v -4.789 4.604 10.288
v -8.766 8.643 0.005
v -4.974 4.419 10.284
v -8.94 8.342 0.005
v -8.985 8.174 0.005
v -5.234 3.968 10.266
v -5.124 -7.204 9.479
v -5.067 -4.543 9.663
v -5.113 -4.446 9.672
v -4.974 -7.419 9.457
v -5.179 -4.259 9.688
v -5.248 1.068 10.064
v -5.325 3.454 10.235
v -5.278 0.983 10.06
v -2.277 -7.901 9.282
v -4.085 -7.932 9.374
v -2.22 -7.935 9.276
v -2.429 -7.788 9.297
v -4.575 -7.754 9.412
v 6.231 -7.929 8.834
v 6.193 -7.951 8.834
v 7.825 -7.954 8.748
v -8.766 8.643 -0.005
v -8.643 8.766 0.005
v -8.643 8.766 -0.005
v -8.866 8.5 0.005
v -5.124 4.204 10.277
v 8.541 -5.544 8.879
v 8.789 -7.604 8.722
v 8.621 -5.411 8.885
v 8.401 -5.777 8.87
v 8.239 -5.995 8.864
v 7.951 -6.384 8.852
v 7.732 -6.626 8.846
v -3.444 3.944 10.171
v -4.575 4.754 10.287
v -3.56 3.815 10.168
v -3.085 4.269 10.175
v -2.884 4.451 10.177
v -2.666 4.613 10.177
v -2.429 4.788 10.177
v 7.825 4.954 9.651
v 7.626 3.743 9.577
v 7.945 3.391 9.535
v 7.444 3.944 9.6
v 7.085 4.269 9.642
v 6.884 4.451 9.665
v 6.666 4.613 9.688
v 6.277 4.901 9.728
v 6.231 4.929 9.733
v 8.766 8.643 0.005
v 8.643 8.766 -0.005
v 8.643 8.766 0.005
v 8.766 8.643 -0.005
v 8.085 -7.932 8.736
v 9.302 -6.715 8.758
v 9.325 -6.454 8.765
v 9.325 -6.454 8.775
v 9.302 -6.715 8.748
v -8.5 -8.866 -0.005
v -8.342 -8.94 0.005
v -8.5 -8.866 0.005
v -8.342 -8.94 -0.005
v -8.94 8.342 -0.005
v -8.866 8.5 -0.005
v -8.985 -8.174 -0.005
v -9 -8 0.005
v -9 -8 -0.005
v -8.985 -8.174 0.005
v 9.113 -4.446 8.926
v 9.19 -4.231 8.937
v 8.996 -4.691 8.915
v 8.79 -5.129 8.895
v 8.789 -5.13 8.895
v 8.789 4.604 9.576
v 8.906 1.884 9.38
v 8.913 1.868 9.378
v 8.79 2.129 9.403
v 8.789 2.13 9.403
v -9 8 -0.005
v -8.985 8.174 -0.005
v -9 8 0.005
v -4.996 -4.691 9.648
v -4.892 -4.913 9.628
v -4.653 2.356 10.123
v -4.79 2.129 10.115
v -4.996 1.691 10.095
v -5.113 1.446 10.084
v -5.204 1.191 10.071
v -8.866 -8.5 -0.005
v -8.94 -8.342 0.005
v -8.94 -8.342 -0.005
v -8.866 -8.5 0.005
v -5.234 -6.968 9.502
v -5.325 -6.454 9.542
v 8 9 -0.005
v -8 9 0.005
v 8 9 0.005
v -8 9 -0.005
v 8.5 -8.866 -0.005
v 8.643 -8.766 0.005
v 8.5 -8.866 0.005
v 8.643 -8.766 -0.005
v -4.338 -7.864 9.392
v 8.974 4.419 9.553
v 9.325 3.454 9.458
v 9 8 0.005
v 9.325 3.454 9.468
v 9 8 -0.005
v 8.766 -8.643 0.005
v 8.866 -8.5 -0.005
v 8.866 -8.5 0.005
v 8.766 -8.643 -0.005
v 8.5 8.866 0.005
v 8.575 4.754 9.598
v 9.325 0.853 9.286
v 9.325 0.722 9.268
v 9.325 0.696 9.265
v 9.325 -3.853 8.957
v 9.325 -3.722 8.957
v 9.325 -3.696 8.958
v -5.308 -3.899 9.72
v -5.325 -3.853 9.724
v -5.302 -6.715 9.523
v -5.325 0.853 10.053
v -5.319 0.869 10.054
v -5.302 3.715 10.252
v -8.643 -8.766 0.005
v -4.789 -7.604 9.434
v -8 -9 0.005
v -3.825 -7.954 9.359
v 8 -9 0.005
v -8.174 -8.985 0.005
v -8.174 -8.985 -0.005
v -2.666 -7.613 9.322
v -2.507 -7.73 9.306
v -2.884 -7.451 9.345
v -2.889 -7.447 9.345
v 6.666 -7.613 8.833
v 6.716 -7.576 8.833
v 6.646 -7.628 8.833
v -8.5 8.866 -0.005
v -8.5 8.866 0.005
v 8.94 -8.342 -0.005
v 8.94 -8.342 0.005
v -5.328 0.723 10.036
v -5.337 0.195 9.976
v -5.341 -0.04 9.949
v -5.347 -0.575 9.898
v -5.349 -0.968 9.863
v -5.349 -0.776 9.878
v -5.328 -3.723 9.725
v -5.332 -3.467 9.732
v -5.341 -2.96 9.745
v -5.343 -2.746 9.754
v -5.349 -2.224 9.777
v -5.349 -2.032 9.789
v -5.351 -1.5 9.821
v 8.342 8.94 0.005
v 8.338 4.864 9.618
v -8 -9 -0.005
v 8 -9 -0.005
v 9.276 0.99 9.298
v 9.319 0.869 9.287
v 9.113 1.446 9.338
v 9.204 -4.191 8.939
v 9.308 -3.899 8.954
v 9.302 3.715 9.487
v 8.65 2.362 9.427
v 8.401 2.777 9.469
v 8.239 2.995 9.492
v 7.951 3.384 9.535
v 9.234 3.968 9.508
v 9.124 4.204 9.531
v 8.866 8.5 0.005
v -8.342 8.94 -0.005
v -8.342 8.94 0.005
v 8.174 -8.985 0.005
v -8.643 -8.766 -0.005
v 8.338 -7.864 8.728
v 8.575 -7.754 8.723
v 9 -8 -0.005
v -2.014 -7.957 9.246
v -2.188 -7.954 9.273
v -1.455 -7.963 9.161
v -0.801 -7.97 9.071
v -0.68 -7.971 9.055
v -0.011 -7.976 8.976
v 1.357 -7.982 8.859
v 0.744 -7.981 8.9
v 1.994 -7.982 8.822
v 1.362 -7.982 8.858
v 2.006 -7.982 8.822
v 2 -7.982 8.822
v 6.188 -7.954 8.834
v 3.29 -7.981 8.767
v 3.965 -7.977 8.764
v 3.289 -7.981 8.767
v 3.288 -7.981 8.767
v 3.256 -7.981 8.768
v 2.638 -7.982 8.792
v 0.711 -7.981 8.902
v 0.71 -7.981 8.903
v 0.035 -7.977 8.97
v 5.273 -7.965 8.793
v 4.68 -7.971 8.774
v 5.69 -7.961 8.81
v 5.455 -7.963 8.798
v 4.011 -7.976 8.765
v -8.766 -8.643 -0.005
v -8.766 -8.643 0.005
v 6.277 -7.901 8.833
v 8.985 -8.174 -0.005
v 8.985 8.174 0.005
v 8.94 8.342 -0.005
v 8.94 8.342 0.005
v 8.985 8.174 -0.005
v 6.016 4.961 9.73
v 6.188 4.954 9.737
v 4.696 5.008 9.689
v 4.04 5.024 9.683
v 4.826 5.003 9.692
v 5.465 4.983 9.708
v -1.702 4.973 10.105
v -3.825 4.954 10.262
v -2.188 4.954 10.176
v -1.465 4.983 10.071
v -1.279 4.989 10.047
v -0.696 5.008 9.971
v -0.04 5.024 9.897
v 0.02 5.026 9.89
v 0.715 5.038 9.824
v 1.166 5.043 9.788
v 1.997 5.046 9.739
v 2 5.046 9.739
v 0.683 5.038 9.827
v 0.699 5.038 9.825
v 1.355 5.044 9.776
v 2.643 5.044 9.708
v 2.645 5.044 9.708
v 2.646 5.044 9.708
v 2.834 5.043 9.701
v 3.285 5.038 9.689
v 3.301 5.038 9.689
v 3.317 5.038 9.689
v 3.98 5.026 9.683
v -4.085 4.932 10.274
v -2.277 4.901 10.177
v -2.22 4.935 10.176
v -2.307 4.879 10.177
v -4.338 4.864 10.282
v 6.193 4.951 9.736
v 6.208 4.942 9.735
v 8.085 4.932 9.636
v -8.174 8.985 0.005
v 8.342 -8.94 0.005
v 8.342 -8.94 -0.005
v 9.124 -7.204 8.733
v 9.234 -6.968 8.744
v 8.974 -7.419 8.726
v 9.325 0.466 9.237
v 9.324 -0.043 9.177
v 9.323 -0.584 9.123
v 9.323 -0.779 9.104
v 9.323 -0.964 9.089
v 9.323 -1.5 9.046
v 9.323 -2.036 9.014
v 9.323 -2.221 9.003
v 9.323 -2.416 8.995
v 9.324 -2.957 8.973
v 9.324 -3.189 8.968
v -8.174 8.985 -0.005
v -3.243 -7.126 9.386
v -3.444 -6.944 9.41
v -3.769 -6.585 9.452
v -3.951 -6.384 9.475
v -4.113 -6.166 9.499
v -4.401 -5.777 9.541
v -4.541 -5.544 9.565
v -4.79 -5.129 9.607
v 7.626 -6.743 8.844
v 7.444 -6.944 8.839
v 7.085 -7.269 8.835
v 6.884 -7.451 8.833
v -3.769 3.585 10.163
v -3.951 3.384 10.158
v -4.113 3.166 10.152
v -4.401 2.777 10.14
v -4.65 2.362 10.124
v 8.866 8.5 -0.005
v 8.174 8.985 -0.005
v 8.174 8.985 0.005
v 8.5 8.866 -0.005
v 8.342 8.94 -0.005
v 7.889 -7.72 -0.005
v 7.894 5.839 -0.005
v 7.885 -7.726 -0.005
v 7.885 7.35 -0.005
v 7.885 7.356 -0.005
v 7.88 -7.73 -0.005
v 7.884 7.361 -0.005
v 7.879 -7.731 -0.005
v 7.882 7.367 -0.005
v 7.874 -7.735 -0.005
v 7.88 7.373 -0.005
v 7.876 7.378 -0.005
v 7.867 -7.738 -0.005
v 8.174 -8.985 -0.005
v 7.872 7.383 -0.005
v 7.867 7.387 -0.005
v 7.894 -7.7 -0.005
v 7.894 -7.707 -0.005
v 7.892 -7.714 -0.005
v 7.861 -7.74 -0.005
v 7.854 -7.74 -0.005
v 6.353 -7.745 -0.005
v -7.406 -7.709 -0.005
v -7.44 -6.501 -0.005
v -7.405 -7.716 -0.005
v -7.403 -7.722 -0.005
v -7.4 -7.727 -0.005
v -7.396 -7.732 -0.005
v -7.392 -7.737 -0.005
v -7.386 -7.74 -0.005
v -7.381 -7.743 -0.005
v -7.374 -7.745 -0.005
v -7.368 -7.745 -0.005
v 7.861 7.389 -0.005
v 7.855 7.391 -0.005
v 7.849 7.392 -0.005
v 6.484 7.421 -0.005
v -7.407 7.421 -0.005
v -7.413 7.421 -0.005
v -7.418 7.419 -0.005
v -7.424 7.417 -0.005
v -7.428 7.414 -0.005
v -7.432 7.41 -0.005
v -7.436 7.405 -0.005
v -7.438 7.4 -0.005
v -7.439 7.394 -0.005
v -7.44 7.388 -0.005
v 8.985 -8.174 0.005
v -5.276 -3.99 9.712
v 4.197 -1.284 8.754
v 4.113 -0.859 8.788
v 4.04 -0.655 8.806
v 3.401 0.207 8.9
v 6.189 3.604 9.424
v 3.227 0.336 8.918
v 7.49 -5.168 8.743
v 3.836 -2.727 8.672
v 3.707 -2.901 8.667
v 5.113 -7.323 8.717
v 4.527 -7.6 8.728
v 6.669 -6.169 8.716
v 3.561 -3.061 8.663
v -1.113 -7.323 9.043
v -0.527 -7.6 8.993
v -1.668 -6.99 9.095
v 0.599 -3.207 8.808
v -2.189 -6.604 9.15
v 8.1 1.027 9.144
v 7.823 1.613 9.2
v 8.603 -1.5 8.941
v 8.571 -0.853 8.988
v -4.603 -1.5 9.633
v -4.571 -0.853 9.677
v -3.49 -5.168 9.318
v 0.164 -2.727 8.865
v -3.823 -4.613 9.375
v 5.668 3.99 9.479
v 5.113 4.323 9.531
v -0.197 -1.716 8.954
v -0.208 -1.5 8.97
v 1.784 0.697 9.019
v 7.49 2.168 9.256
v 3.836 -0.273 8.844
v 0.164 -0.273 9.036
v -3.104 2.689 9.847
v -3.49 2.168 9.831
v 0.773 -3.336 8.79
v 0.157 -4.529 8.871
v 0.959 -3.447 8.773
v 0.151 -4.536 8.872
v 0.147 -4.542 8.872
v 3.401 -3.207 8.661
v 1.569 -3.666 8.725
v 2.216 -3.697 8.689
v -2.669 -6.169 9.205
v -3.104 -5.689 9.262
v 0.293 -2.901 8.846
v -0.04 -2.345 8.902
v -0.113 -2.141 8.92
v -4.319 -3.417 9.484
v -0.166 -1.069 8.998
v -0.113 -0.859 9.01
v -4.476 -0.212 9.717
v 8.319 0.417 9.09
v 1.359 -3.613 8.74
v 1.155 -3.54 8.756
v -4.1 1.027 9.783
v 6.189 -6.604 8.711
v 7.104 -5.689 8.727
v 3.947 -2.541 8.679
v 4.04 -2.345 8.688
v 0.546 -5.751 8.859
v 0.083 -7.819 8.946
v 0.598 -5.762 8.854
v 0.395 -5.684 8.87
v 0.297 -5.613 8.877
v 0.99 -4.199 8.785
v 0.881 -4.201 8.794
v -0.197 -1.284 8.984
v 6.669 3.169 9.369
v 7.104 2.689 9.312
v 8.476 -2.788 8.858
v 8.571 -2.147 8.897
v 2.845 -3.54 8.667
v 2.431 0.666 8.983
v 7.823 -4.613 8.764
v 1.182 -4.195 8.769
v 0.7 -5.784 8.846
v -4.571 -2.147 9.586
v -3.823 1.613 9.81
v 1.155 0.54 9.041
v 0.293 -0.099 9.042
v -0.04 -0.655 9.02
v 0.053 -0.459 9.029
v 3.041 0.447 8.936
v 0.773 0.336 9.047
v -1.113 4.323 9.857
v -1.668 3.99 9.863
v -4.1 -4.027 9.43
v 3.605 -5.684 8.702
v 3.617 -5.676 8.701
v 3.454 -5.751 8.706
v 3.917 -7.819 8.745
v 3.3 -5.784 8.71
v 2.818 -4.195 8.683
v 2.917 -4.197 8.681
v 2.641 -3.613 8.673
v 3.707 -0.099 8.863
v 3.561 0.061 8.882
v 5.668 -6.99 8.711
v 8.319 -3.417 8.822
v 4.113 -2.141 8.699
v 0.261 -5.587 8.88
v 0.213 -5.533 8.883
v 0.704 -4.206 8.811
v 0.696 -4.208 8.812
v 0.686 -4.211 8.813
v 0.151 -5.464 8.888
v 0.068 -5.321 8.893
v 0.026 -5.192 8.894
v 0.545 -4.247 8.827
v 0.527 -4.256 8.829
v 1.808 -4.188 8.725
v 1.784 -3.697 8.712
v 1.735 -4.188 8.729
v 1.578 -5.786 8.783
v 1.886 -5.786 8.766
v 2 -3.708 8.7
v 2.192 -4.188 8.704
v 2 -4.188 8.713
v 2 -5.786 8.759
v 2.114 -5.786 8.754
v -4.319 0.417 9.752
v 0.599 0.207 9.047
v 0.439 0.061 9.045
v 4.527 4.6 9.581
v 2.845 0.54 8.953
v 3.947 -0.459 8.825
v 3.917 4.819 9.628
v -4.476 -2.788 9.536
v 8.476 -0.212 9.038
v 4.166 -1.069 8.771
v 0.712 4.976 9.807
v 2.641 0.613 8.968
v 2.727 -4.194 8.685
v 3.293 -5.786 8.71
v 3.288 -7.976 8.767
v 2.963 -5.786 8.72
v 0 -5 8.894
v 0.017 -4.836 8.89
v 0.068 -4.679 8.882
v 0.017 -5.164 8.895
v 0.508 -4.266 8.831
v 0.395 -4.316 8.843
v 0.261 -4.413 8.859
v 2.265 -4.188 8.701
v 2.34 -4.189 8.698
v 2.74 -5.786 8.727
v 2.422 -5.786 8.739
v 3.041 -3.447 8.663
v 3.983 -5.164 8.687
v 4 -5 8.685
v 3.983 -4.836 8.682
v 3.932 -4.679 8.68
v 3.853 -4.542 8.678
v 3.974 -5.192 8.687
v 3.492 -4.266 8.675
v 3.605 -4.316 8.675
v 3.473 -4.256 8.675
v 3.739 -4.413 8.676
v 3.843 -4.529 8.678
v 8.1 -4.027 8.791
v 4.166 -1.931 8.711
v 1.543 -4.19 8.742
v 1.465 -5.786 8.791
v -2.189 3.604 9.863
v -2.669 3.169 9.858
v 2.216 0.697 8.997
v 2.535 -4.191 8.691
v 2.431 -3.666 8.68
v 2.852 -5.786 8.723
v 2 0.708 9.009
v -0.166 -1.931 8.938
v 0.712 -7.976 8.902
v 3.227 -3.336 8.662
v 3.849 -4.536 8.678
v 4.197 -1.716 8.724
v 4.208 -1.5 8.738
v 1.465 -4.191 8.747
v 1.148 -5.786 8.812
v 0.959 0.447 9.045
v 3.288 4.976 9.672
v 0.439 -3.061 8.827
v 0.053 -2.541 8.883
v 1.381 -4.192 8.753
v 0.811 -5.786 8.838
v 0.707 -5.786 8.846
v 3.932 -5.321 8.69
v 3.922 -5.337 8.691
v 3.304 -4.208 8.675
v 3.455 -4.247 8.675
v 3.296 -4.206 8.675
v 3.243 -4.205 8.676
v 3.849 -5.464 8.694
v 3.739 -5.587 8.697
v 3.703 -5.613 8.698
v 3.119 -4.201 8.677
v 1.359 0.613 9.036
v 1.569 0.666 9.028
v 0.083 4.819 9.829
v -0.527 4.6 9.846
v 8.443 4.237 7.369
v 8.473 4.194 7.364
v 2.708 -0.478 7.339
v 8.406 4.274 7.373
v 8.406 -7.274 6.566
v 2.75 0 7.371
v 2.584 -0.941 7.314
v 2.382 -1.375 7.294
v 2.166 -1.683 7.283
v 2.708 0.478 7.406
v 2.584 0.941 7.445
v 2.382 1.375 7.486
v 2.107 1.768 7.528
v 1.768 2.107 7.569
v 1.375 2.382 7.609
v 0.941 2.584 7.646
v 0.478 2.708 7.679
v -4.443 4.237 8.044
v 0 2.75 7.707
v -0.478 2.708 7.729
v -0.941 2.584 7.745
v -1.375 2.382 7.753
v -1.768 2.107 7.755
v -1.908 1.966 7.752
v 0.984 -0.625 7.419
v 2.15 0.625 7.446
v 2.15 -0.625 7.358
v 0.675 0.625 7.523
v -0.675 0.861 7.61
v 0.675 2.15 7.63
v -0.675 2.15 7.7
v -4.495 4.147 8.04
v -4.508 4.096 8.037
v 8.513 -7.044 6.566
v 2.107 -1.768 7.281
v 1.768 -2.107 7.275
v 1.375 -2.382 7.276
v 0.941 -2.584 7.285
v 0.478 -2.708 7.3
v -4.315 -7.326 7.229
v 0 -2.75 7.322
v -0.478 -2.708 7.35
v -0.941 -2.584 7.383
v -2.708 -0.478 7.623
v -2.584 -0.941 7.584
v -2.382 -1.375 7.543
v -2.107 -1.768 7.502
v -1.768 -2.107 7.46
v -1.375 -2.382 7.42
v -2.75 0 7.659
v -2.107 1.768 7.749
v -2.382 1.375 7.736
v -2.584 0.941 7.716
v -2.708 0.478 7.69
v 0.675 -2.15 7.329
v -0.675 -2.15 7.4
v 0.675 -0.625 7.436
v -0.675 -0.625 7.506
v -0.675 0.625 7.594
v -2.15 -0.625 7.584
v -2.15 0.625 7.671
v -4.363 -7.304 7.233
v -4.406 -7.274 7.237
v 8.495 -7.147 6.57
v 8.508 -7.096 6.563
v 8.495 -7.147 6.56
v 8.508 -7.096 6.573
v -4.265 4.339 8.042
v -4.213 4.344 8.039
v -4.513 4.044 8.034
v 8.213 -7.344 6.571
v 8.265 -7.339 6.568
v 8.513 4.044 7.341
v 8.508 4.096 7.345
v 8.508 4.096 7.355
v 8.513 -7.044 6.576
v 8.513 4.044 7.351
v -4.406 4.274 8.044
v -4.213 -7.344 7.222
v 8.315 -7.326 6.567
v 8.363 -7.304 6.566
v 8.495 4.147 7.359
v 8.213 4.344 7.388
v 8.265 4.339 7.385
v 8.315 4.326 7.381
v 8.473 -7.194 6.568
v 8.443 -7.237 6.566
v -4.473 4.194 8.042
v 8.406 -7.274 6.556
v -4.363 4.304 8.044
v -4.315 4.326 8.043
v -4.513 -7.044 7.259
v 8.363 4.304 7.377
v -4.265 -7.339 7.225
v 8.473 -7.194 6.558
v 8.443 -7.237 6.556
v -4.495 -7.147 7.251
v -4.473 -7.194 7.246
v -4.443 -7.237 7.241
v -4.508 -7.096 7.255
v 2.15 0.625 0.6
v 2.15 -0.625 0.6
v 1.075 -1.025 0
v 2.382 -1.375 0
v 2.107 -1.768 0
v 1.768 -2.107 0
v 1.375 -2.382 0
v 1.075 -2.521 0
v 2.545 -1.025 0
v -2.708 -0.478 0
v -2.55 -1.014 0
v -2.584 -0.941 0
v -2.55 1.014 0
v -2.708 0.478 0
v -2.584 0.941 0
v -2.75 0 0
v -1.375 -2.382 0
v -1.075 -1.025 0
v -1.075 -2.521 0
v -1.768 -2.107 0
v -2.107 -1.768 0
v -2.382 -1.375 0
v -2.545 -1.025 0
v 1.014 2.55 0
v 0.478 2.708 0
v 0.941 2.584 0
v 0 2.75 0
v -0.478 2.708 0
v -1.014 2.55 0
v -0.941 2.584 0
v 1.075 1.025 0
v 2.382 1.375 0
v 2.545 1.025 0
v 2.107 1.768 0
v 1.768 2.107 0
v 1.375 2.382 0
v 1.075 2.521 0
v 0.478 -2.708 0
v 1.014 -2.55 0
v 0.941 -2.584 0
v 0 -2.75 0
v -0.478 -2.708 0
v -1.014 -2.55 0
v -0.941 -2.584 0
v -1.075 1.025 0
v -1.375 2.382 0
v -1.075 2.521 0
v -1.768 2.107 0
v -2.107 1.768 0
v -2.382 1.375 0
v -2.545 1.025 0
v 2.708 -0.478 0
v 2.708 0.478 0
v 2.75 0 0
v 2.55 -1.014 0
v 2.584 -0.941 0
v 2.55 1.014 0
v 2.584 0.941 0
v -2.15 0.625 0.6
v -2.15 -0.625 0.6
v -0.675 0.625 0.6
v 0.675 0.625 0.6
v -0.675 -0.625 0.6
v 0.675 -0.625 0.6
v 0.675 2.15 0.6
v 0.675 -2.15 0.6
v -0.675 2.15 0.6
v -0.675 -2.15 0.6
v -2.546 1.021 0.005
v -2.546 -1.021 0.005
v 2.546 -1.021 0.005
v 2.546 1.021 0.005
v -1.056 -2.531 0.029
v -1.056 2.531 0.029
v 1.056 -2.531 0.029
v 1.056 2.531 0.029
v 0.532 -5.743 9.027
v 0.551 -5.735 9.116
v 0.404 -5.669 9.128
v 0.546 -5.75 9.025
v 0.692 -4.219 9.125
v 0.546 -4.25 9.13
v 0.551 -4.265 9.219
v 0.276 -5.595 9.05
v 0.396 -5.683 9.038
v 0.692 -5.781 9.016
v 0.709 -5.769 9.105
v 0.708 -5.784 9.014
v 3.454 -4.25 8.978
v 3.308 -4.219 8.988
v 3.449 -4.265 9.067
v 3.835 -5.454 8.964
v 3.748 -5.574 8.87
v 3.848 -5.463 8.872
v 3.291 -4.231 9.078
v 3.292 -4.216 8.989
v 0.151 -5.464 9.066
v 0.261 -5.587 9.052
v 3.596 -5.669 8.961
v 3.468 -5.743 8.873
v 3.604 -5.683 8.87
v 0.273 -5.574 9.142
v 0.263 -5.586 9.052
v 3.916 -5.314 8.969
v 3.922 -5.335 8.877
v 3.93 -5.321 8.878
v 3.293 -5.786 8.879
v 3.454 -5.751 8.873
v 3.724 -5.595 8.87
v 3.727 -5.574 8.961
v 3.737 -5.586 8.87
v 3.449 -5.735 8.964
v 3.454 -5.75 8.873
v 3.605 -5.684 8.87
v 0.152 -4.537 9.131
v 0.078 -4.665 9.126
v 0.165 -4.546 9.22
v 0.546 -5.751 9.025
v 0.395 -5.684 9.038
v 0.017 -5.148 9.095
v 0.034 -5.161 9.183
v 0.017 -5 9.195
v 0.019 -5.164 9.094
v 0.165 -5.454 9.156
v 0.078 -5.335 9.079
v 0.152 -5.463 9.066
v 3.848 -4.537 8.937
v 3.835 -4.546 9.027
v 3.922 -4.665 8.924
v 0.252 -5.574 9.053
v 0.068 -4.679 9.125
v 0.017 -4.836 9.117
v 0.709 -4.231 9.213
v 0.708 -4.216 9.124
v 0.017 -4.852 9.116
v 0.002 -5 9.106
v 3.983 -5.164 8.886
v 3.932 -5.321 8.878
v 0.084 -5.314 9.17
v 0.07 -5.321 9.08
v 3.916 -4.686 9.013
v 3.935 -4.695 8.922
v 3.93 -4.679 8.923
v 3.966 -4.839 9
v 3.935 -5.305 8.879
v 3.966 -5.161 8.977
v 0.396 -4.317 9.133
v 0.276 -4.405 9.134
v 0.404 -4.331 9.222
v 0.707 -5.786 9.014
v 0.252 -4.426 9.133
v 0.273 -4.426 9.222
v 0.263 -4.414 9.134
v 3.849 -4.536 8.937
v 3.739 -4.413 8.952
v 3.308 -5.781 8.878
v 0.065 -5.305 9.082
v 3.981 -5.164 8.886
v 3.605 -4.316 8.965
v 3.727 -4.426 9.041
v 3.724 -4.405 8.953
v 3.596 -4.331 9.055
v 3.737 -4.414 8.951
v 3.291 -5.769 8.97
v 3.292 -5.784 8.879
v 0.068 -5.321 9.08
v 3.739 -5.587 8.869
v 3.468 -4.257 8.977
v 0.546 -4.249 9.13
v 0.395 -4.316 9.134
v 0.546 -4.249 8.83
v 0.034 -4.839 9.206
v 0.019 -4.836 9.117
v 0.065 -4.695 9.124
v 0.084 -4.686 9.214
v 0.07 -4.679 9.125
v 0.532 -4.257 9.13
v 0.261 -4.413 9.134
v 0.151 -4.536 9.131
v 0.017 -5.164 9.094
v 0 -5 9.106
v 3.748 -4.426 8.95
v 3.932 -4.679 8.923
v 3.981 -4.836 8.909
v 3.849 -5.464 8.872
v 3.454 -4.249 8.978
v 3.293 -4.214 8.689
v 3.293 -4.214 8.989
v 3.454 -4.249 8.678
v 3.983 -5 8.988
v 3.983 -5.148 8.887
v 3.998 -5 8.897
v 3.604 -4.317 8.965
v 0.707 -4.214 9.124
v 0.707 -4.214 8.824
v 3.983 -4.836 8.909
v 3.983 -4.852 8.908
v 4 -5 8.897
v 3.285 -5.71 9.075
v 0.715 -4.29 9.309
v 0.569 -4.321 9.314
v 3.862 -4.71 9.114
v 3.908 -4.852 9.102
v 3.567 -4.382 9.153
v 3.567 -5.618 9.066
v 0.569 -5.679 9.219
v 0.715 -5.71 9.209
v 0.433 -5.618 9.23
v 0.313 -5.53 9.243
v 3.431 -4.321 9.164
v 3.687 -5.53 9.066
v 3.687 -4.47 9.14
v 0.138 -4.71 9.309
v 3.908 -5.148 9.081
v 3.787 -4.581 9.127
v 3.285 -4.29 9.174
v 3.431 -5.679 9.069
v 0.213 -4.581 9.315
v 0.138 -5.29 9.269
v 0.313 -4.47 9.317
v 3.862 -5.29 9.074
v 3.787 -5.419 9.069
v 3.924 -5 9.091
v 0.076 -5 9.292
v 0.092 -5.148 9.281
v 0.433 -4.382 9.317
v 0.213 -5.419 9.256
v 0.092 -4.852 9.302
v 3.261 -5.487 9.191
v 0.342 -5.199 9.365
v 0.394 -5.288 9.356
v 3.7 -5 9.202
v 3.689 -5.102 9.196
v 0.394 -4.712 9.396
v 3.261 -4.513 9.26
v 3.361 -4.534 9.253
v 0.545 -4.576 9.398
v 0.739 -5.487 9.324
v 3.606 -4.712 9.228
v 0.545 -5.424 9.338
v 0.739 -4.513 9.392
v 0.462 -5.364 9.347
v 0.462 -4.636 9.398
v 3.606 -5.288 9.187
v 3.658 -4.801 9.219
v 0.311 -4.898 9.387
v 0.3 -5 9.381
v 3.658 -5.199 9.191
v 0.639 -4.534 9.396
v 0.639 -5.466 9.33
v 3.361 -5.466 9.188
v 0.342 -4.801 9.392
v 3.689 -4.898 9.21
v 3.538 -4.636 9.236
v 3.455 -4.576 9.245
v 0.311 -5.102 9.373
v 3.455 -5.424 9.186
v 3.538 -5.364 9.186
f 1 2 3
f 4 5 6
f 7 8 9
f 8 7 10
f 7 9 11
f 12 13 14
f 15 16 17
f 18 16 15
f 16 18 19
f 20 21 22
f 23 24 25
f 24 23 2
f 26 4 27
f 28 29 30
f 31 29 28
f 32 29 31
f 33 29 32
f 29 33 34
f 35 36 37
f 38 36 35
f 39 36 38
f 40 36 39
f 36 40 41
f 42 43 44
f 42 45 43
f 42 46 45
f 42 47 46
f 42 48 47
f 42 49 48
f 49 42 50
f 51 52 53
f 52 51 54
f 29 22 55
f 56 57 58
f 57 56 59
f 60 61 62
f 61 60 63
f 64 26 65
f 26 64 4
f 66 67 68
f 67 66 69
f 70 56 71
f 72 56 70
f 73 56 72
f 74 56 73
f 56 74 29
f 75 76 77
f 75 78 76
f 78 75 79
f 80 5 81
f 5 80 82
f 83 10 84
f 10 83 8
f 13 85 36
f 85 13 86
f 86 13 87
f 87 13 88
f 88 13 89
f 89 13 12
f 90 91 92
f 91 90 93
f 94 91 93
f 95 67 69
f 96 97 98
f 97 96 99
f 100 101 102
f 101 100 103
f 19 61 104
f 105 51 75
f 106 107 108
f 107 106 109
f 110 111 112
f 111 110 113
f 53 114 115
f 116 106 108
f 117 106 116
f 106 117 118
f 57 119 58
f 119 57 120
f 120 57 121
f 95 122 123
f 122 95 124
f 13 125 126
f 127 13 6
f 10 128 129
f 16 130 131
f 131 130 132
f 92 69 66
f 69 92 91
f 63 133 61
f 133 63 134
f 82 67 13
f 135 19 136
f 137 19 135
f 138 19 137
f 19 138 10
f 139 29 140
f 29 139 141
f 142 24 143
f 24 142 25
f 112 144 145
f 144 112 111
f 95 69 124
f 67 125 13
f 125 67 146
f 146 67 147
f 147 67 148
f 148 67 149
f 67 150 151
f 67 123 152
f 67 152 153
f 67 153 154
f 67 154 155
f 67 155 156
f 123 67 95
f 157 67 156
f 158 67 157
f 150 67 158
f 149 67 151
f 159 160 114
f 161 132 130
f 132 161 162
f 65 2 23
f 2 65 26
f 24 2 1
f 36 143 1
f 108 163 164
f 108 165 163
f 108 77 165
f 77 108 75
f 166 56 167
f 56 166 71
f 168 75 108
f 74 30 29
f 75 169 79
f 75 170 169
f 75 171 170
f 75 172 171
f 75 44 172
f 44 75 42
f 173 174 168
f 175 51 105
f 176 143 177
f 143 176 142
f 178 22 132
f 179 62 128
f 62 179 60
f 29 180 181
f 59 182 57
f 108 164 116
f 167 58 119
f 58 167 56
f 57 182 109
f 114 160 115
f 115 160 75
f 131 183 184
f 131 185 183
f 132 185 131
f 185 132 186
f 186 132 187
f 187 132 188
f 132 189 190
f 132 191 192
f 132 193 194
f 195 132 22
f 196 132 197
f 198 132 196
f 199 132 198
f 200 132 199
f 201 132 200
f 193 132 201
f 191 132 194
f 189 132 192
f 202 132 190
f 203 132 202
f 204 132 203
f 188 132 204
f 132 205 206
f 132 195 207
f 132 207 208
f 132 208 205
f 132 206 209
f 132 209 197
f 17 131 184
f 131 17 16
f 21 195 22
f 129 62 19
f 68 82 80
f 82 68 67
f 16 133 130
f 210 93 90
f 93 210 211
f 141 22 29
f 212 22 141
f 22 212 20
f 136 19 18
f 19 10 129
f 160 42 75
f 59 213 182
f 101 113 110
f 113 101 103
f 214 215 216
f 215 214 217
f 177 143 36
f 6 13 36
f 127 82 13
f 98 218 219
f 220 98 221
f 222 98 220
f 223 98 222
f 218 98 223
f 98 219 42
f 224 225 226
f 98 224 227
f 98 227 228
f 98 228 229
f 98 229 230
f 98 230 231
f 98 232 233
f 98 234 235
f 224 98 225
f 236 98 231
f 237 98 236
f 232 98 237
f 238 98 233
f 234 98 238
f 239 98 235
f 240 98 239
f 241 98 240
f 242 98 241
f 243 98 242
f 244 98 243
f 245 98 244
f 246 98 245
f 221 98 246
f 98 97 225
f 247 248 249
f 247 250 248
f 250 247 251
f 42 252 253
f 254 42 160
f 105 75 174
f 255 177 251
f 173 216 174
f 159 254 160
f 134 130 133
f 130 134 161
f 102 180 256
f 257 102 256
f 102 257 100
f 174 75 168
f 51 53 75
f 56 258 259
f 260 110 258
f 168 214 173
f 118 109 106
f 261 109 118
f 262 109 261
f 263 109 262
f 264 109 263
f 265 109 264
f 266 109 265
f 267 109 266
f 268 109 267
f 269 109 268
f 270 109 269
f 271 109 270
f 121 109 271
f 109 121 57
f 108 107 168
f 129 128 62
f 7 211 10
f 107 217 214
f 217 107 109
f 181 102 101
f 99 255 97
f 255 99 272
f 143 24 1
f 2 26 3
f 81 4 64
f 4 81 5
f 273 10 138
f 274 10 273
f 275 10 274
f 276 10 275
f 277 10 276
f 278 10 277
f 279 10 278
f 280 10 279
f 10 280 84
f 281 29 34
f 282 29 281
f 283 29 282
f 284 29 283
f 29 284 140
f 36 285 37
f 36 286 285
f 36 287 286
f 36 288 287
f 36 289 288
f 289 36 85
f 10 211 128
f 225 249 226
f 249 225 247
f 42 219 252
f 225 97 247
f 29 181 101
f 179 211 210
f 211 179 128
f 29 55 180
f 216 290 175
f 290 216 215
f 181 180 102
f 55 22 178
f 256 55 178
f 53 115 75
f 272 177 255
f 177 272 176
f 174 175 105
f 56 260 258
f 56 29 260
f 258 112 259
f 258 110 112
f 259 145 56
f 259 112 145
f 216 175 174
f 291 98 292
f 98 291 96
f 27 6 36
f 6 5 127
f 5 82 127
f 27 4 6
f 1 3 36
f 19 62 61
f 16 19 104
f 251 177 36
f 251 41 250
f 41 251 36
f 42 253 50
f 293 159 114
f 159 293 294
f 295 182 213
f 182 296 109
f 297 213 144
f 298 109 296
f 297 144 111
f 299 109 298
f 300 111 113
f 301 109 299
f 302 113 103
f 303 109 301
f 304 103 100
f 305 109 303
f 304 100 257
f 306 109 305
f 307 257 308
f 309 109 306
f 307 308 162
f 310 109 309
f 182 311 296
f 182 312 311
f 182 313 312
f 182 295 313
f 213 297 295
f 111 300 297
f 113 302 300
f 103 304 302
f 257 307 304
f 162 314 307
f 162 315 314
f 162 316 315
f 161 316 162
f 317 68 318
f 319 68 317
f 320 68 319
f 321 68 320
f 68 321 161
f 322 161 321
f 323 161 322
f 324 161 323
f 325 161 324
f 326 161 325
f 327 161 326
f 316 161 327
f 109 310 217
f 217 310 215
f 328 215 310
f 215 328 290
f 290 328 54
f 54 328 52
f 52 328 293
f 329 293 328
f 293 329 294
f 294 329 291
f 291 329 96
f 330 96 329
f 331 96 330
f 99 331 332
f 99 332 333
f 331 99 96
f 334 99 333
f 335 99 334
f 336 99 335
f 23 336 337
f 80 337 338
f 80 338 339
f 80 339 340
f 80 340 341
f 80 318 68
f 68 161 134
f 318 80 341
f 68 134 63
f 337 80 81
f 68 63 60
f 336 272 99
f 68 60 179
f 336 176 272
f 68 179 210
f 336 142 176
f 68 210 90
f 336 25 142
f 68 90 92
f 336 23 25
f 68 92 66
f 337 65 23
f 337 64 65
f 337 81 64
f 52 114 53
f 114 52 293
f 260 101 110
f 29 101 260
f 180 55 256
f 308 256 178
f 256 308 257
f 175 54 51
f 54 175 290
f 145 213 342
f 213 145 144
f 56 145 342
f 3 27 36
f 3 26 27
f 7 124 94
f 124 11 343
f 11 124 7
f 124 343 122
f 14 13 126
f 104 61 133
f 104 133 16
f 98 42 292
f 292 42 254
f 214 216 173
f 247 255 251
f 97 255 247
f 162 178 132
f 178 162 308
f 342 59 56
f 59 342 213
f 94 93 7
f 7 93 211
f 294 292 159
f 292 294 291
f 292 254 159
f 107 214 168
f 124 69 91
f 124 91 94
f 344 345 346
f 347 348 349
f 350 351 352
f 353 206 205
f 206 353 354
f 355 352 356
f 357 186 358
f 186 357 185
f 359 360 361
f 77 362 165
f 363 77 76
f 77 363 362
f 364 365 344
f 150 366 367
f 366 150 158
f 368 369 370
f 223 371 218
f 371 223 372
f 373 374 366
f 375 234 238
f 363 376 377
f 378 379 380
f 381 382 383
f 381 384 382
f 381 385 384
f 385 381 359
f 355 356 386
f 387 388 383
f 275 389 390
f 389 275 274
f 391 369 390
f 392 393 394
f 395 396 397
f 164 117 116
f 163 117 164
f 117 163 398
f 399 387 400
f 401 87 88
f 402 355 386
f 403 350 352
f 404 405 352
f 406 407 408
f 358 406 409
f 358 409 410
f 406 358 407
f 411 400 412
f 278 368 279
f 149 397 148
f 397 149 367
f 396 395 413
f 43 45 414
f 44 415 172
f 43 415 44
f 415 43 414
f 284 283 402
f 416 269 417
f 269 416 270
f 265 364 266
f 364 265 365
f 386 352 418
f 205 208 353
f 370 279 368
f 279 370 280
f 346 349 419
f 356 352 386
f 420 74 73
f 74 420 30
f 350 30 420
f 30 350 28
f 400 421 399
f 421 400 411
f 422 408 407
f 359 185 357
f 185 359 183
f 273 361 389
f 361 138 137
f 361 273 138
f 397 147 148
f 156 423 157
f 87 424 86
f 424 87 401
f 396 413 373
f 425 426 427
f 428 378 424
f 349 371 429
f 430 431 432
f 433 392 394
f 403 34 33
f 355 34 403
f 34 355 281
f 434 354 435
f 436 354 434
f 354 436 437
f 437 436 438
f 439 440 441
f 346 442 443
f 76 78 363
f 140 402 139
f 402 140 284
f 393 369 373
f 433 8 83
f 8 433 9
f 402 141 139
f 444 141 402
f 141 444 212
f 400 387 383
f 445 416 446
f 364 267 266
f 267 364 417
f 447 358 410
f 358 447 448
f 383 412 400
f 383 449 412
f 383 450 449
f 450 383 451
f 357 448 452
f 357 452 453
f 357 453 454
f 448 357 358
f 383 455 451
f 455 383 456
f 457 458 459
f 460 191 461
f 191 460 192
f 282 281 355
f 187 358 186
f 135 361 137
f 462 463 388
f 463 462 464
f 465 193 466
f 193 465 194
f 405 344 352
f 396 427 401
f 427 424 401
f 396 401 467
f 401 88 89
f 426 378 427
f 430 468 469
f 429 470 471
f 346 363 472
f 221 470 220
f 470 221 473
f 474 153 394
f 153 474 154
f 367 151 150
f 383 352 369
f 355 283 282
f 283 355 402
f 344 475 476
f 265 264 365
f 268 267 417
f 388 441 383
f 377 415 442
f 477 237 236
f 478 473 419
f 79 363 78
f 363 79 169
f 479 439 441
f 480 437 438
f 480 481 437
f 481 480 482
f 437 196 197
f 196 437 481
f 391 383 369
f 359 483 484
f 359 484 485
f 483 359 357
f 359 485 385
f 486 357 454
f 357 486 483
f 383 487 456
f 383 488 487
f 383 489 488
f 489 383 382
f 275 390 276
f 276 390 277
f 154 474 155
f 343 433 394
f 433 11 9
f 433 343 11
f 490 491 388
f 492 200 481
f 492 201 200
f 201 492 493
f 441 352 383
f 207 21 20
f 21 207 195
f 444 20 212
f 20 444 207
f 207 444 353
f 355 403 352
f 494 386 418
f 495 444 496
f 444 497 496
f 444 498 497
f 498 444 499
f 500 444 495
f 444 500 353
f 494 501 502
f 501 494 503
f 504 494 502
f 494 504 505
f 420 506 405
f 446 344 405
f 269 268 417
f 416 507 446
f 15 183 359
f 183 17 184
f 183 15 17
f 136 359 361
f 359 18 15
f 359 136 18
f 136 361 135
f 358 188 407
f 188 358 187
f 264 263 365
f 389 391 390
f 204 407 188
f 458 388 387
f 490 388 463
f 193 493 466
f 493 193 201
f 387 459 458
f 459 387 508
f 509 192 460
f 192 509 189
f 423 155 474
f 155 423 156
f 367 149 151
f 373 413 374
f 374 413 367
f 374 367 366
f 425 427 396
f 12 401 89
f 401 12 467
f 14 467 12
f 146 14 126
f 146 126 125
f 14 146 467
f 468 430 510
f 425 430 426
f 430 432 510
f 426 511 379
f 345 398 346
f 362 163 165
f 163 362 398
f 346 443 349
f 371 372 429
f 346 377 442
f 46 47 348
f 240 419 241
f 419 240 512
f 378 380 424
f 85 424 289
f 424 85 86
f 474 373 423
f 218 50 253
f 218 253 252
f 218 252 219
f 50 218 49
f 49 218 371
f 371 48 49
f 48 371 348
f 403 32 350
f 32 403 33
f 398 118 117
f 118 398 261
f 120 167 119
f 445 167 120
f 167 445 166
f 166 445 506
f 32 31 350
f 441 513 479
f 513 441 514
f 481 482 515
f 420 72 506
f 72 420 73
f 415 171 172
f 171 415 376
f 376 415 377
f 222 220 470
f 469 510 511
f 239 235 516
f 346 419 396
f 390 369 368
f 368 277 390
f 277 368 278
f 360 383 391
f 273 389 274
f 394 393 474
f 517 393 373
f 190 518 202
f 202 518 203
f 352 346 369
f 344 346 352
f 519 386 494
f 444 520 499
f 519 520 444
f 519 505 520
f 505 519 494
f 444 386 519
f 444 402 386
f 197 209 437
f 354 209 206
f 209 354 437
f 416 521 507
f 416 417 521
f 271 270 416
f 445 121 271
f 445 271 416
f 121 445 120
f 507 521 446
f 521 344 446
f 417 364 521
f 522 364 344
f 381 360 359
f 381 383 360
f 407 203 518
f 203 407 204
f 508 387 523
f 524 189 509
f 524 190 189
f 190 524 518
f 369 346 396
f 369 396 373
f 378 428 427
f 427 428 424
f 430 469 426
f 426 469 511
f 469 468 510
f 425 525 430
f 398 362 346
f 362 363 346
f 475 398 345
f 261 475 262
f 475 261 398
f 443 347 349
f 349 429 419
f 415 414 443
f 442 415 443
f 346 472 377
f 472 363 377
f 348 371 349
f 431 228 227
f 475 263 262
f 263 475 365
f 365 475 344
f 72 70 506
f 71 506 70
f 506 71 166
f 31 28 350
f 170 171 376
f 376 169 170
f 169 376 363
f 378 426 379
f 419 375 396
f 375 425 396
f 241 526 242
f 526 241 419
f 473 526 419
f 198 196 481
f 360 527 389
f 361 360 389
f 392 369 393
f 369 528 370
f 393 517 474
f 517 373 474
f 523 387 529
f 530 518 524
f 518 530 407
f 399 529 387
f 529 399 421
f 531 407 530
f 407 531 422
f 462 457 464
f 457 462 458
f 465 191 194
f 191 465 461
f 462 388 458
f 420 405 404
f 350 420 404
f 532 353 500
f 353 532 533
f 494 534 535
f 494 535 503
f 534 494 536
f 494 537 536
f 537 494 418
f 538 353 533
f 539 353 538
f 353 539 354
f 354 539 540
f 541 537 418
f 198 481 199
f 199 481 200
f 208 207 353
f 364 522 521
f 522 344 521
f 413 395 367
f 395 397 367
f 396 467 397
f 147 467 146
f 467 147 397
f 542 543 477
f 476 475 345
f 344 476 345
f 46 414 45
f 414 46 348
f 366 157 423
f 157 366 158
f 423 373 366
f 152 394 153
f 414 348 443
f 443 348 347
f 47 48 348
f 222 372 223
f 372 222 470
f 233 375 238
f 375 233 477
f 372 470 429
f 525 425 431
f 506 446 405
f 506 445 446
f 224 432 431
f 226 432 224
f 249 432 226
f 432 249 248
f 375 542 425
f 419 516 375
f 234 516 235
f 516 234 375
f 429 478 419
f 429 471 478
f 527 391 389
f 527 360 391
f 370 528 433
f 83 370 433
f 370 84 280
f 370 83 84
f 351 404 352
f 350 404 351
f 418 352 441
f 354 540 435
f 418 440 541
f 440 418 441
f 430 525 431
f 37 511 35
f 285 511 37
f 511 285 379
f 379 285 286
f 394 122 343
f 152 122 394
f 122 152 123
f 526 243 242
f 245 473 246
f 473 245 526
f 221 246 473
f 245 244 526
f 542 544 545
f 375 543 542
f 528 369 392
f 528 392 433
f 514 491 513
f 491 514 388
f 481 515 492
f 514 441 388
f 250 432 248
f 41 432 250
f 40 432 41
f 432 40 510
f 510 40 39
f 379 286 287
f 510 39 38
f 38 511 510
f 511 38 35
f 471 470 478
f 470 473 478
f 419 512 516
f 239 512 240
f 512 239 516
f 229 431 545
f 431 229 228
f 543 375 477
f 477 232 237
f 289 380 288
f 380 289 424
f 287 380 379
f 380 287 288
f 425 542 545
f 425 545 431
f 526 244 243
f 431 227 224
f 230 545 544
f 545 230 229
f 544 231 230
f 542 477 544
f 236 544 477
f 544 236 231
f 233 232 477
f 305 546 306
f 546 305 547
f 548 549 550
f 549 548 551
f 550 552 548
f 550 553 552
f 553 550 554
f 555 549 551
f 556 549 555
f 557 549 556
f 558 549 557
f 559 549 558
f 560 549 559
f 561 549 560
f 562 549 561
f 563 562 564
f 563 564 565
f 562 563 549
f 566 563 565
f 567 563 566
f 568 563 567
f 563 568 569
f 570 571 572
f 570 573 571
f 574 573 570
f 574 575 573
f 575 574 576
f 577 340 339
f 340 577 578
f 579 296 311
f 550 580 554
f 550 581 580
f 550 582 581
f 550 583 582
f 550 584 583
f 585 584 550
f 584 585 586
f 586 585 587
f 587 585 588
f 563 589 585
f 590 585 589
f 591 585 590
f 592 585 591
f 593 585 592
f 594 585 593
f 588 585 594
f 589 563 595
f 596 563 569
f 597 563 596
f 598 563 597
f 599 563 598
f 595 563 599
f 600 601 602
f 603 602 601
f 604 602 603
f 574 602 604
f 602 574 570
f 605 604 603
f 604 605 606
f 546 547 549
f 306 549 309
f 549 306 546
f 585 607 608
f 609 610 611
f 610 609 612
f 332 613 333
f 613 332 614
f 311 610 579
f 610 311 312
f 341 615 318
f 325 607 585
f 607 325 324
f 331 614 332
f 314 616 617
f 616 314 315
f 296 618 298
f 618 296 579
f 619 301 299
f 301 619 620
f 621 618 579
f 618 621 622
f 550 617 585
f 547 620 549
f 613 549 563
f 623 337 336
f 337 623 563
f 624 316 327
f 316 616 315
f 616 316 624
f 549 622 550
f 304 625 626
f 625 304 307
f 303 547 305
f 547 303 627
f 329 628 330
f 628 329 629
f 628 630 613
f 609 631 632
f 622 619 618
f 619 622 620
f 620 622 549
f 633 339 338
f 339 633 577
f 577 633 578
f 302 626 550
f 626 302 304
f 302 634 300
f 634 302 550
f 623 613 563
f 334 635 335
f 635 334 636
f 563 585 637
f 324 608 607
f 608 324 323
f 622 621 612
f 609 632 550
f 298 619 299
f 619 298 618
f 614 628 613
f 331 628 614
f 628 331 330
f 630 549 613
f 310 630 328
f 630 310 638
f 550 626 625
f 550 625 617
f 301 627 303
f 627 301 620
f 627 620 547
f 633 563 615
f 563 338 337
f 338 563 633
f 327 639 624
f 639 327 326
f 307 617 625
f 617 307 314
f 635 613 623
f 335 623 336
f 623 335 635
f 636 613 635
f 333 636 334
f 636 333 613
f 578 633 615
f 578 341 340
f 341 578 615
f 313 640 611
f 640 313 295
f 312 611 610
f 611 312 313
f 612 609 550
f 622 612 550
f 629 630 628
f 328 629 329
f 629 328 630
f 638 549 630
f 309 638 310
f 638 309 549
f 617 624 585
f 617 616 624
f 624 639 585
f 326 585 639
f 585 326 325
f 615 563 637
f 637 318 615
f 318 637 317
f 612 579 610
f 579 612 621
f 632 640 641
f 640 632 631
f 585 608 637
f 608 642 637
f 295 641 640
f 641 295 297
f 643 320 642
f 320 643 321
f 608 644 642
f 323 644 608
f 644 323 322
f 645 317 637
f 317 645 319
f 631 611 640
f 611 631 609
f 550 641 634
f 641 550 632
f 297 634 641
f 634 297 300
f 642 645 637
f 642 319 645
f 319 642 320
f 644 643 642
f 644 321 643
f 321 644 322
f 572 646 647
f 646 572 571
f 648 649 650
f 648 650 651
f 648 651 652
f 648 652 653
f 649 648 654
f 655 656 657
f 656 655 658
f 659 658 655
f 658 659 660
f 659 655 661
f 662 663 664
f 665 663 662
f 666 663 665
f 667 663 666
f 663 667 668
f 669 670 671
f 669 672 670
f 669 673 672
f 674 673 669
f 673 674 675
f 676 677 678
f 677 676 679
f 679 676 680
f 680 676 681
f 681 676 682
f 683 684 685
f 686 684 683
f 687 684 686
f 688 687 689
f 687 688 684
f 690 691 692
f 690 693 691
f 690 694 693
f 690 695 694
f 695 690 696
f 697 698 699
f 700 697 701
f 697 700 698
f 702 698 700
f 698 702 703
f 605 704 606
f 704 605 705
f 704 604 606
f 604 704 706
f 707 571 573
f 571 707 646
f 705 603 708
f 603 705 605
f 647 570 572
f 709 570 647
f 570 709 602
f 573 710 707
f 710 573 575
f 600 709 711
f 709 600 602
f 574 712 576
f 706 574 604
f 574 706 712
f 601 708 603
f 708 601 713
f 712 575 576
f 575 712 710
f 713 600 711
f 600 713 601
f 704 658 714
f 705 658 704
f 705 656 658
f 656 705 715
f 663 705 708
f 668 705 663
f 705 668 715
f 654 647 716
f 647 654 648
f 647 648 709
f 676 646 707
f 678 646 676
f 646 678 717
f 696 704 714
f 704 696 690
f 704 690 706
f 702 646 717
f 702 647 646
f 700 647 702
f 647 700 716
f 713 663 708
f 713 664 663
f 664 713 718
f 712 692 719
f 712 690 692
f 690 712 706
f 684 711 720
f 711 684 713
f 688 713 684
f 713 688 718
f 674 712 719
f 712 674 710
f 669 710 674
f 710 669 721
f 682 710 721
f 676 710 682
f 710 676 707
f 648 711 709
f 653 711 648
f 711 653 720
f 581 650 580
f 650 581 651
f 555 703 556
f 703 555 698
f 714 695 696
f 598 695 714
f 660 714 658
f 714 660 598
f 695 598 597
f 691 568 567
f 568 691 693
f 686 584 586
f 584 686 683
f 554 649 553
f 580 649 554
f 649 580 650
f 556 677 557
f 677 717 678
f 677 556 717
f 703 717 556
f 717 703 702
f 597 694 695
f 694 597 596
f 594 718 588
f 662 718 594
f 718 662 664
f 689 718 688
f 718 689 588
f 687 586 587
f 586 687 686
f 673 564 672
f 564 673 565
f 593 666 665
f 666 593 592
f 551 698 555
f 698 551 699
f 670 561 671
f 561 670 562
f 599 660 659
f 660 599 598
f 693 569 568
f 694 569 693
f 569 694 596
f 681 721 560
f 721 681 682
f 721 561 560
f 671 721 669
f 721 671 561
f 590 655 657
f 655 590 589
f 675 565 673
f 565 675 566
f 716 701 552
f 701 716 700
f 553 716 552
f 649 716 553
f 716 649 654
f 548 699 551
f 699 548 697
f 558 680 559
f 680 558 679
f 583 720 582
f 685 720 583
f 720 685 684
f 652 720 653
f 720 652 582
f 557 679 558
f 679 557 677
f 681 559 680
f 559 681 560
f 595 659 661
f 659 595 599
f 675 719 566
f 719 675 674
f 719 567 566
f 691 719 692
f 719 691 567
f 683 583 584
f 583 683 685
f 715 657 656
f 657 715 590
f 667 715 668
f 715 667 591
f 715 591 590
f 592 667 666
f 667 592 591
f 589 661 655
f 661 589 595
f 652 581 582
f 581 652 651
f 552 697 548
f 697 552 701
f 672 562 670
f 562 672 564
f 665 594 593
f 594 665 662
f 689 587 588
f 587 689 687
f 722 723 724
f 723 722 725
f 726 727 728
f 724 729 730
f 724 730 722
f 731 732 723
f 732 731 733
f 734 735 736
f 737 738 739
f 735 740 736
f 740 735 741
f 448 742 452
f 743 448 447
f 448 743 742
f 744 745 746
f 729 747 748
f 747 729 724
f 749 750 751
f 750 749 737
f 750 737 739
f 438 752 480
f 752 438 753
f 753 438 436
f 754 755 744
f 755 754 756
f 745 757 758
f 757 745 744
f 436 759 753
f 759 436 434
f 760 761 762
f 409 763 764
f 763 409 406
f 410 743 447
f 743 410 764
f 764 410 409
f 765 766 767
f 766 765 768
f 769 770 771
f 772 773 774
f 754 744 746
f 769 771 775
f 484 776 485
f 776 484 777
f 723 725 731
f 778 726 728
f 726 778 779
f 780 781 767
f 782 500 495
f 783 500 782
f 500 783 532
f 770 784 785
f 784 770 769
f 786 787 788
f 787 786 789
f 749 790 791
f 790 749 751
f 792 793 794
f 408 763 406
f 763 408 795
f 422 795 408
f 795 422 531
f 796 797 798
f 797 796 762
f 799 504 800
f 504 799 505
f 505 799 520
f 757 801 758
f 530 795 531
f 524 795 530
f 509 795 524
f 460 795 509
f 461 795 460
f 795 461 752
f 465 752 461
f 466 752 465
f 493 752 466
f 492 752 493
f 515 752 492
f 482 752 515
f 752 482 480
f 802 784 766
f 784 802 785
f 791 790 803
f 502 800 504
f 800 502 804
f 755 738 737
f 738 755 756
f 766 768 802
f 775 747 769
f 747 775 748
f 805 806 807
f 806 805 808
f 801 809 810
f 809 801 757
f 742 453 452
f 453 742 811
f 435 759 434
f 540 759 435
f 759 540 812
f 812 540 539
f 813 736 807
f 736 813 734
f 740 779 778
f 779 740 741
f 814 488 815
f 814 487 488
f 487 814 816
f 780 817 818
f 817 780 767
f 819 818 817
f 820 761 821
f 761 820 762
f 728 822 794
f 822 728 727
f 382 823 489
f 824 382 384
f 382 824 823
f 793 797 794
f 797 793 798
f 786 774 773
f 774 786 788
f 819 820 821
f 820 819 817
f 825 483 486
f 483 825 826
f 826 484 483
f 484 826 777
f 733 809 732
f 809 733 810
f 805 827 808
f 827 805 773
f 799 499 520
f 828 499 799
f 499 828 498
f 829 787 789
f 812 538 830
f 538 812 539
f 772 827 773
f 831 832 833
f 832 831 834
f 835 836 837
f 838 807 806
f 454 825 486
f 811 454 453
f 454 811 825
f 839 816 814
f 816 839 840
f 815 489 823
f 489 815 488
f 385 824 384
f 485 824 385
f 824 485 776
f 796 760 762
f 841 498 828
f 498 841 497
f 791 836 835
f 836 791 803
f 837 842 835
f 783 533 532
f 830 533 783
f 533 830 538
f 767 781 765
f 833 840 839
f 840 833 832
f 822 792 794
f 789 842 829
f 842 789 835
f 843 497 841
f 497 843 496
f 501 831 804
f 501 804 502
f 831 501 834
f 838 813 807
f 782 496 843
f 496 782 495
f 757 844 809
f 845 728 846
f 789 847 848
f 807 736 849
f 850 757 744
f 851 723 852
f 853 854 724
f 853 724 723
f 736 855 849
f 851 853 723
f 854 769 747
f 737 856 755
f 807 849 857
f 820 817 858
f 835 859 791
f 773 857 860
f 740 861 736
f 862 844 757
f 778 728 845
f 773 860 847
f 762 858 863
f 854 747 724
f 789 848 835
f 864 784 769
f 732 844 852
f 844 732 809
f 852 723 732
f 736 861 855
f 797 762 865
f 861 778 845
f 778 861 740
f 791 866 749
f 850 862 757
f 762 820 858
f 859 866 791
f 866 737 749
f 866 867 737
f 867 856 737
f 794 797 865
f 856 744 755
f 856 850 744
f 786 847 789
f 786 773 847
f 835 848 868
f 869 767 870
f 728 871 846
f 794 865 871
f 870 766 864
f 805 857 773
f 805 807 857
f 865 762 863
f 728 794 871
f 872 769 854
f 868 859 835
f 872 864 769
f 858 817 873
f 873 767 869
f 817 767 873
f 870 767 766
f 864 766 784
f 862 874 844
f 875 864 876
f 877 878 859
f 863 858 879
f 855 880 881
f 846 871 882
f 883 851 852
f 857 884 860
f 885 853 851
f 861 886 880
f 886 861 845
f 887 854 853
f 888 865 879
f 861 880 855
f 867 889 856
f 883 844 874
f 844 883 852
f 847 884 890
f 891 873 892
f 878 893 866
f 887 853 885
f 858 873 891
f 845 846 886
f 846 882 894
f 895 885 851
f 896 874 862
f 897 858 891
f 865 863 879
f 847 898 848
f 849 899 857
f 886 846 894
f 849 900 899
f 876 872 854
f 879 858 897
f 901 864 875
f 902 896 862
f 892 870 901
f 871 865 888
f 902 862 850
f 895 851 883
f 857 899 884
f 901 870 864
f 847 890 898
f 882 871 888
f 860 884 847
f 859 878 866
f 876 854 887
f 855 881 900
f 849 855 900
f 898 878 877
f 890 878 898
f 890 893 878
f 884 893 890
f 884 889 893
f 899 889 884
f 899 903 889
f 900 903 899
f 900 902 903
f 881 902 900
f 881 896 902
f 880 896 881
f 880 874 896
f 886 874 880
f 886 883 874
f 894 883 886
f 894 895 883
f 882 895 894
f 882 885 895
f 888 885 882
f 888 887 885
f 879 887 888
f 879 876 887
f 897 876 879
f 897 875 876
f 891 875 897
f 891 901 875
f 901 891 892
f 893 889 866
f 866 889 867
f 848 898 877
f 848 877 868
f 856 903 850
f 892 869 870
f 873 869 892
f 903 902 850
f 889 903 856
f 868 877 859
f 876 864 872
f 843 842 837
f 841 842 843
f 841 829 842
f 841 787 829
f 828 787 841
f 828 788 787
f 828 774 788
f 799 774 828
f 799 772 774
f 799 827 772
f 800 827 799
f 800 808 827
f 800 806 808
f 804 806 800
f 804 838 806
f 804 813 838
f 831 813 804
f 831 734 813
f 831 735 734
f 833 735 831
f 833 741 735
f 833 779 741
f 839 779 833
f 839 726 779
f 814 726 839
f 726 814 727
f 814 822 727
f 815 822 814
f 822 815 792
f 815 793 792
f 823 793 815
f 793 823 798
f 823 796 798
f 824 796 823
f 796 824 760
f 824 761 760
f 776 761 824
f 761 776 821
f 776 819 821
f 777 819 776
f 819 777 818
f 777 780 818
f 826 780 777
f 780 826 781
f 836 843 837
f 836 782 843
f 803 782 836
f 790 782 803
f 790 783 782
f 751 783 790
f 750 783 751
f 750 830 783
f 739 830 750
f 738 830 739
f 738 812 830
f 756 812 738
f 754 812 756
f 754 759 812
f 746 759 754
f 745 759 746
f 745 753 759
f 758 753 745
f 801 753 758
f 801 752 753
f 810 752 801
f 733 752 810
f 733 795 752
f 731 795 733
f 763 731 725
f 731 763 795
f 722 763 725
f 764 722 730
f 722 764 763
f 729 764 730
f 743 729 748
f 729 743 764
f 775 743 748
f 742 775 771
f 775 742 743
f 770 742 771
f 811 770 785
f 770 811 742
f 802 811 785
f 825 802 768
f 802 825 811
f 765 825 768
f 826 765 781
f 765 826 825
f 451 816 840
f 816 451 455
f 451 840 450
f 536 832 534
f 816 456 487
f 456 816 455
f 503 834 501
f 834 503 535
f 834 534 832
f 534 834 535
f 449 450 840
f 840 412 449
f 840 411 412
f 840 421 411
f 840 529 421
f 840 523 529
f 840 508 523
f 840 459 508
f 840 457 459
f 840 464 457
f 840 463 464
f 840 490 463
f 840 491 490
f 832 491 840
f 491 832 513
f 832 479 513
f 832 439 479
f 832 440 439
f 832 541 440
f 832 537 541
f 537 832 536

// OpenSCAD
export_target = "preview";

include <common/custom-shell-params.scad>

user_key_width = 18;
user_key_depth = 18;
user_top_center_height = 9.5;
user_top_pitch_deg = 4;
user_top_roll_deg = -3;
user_top_offset_x = 2.0;
user_top_offset_y = -1.5;
user_top_shape_type = "spherical";
user_dish_depth = 0.7;

user_legend_text = "OFF";
user_homing_bar_enabled = true;

include <../base/keycap.scad>
